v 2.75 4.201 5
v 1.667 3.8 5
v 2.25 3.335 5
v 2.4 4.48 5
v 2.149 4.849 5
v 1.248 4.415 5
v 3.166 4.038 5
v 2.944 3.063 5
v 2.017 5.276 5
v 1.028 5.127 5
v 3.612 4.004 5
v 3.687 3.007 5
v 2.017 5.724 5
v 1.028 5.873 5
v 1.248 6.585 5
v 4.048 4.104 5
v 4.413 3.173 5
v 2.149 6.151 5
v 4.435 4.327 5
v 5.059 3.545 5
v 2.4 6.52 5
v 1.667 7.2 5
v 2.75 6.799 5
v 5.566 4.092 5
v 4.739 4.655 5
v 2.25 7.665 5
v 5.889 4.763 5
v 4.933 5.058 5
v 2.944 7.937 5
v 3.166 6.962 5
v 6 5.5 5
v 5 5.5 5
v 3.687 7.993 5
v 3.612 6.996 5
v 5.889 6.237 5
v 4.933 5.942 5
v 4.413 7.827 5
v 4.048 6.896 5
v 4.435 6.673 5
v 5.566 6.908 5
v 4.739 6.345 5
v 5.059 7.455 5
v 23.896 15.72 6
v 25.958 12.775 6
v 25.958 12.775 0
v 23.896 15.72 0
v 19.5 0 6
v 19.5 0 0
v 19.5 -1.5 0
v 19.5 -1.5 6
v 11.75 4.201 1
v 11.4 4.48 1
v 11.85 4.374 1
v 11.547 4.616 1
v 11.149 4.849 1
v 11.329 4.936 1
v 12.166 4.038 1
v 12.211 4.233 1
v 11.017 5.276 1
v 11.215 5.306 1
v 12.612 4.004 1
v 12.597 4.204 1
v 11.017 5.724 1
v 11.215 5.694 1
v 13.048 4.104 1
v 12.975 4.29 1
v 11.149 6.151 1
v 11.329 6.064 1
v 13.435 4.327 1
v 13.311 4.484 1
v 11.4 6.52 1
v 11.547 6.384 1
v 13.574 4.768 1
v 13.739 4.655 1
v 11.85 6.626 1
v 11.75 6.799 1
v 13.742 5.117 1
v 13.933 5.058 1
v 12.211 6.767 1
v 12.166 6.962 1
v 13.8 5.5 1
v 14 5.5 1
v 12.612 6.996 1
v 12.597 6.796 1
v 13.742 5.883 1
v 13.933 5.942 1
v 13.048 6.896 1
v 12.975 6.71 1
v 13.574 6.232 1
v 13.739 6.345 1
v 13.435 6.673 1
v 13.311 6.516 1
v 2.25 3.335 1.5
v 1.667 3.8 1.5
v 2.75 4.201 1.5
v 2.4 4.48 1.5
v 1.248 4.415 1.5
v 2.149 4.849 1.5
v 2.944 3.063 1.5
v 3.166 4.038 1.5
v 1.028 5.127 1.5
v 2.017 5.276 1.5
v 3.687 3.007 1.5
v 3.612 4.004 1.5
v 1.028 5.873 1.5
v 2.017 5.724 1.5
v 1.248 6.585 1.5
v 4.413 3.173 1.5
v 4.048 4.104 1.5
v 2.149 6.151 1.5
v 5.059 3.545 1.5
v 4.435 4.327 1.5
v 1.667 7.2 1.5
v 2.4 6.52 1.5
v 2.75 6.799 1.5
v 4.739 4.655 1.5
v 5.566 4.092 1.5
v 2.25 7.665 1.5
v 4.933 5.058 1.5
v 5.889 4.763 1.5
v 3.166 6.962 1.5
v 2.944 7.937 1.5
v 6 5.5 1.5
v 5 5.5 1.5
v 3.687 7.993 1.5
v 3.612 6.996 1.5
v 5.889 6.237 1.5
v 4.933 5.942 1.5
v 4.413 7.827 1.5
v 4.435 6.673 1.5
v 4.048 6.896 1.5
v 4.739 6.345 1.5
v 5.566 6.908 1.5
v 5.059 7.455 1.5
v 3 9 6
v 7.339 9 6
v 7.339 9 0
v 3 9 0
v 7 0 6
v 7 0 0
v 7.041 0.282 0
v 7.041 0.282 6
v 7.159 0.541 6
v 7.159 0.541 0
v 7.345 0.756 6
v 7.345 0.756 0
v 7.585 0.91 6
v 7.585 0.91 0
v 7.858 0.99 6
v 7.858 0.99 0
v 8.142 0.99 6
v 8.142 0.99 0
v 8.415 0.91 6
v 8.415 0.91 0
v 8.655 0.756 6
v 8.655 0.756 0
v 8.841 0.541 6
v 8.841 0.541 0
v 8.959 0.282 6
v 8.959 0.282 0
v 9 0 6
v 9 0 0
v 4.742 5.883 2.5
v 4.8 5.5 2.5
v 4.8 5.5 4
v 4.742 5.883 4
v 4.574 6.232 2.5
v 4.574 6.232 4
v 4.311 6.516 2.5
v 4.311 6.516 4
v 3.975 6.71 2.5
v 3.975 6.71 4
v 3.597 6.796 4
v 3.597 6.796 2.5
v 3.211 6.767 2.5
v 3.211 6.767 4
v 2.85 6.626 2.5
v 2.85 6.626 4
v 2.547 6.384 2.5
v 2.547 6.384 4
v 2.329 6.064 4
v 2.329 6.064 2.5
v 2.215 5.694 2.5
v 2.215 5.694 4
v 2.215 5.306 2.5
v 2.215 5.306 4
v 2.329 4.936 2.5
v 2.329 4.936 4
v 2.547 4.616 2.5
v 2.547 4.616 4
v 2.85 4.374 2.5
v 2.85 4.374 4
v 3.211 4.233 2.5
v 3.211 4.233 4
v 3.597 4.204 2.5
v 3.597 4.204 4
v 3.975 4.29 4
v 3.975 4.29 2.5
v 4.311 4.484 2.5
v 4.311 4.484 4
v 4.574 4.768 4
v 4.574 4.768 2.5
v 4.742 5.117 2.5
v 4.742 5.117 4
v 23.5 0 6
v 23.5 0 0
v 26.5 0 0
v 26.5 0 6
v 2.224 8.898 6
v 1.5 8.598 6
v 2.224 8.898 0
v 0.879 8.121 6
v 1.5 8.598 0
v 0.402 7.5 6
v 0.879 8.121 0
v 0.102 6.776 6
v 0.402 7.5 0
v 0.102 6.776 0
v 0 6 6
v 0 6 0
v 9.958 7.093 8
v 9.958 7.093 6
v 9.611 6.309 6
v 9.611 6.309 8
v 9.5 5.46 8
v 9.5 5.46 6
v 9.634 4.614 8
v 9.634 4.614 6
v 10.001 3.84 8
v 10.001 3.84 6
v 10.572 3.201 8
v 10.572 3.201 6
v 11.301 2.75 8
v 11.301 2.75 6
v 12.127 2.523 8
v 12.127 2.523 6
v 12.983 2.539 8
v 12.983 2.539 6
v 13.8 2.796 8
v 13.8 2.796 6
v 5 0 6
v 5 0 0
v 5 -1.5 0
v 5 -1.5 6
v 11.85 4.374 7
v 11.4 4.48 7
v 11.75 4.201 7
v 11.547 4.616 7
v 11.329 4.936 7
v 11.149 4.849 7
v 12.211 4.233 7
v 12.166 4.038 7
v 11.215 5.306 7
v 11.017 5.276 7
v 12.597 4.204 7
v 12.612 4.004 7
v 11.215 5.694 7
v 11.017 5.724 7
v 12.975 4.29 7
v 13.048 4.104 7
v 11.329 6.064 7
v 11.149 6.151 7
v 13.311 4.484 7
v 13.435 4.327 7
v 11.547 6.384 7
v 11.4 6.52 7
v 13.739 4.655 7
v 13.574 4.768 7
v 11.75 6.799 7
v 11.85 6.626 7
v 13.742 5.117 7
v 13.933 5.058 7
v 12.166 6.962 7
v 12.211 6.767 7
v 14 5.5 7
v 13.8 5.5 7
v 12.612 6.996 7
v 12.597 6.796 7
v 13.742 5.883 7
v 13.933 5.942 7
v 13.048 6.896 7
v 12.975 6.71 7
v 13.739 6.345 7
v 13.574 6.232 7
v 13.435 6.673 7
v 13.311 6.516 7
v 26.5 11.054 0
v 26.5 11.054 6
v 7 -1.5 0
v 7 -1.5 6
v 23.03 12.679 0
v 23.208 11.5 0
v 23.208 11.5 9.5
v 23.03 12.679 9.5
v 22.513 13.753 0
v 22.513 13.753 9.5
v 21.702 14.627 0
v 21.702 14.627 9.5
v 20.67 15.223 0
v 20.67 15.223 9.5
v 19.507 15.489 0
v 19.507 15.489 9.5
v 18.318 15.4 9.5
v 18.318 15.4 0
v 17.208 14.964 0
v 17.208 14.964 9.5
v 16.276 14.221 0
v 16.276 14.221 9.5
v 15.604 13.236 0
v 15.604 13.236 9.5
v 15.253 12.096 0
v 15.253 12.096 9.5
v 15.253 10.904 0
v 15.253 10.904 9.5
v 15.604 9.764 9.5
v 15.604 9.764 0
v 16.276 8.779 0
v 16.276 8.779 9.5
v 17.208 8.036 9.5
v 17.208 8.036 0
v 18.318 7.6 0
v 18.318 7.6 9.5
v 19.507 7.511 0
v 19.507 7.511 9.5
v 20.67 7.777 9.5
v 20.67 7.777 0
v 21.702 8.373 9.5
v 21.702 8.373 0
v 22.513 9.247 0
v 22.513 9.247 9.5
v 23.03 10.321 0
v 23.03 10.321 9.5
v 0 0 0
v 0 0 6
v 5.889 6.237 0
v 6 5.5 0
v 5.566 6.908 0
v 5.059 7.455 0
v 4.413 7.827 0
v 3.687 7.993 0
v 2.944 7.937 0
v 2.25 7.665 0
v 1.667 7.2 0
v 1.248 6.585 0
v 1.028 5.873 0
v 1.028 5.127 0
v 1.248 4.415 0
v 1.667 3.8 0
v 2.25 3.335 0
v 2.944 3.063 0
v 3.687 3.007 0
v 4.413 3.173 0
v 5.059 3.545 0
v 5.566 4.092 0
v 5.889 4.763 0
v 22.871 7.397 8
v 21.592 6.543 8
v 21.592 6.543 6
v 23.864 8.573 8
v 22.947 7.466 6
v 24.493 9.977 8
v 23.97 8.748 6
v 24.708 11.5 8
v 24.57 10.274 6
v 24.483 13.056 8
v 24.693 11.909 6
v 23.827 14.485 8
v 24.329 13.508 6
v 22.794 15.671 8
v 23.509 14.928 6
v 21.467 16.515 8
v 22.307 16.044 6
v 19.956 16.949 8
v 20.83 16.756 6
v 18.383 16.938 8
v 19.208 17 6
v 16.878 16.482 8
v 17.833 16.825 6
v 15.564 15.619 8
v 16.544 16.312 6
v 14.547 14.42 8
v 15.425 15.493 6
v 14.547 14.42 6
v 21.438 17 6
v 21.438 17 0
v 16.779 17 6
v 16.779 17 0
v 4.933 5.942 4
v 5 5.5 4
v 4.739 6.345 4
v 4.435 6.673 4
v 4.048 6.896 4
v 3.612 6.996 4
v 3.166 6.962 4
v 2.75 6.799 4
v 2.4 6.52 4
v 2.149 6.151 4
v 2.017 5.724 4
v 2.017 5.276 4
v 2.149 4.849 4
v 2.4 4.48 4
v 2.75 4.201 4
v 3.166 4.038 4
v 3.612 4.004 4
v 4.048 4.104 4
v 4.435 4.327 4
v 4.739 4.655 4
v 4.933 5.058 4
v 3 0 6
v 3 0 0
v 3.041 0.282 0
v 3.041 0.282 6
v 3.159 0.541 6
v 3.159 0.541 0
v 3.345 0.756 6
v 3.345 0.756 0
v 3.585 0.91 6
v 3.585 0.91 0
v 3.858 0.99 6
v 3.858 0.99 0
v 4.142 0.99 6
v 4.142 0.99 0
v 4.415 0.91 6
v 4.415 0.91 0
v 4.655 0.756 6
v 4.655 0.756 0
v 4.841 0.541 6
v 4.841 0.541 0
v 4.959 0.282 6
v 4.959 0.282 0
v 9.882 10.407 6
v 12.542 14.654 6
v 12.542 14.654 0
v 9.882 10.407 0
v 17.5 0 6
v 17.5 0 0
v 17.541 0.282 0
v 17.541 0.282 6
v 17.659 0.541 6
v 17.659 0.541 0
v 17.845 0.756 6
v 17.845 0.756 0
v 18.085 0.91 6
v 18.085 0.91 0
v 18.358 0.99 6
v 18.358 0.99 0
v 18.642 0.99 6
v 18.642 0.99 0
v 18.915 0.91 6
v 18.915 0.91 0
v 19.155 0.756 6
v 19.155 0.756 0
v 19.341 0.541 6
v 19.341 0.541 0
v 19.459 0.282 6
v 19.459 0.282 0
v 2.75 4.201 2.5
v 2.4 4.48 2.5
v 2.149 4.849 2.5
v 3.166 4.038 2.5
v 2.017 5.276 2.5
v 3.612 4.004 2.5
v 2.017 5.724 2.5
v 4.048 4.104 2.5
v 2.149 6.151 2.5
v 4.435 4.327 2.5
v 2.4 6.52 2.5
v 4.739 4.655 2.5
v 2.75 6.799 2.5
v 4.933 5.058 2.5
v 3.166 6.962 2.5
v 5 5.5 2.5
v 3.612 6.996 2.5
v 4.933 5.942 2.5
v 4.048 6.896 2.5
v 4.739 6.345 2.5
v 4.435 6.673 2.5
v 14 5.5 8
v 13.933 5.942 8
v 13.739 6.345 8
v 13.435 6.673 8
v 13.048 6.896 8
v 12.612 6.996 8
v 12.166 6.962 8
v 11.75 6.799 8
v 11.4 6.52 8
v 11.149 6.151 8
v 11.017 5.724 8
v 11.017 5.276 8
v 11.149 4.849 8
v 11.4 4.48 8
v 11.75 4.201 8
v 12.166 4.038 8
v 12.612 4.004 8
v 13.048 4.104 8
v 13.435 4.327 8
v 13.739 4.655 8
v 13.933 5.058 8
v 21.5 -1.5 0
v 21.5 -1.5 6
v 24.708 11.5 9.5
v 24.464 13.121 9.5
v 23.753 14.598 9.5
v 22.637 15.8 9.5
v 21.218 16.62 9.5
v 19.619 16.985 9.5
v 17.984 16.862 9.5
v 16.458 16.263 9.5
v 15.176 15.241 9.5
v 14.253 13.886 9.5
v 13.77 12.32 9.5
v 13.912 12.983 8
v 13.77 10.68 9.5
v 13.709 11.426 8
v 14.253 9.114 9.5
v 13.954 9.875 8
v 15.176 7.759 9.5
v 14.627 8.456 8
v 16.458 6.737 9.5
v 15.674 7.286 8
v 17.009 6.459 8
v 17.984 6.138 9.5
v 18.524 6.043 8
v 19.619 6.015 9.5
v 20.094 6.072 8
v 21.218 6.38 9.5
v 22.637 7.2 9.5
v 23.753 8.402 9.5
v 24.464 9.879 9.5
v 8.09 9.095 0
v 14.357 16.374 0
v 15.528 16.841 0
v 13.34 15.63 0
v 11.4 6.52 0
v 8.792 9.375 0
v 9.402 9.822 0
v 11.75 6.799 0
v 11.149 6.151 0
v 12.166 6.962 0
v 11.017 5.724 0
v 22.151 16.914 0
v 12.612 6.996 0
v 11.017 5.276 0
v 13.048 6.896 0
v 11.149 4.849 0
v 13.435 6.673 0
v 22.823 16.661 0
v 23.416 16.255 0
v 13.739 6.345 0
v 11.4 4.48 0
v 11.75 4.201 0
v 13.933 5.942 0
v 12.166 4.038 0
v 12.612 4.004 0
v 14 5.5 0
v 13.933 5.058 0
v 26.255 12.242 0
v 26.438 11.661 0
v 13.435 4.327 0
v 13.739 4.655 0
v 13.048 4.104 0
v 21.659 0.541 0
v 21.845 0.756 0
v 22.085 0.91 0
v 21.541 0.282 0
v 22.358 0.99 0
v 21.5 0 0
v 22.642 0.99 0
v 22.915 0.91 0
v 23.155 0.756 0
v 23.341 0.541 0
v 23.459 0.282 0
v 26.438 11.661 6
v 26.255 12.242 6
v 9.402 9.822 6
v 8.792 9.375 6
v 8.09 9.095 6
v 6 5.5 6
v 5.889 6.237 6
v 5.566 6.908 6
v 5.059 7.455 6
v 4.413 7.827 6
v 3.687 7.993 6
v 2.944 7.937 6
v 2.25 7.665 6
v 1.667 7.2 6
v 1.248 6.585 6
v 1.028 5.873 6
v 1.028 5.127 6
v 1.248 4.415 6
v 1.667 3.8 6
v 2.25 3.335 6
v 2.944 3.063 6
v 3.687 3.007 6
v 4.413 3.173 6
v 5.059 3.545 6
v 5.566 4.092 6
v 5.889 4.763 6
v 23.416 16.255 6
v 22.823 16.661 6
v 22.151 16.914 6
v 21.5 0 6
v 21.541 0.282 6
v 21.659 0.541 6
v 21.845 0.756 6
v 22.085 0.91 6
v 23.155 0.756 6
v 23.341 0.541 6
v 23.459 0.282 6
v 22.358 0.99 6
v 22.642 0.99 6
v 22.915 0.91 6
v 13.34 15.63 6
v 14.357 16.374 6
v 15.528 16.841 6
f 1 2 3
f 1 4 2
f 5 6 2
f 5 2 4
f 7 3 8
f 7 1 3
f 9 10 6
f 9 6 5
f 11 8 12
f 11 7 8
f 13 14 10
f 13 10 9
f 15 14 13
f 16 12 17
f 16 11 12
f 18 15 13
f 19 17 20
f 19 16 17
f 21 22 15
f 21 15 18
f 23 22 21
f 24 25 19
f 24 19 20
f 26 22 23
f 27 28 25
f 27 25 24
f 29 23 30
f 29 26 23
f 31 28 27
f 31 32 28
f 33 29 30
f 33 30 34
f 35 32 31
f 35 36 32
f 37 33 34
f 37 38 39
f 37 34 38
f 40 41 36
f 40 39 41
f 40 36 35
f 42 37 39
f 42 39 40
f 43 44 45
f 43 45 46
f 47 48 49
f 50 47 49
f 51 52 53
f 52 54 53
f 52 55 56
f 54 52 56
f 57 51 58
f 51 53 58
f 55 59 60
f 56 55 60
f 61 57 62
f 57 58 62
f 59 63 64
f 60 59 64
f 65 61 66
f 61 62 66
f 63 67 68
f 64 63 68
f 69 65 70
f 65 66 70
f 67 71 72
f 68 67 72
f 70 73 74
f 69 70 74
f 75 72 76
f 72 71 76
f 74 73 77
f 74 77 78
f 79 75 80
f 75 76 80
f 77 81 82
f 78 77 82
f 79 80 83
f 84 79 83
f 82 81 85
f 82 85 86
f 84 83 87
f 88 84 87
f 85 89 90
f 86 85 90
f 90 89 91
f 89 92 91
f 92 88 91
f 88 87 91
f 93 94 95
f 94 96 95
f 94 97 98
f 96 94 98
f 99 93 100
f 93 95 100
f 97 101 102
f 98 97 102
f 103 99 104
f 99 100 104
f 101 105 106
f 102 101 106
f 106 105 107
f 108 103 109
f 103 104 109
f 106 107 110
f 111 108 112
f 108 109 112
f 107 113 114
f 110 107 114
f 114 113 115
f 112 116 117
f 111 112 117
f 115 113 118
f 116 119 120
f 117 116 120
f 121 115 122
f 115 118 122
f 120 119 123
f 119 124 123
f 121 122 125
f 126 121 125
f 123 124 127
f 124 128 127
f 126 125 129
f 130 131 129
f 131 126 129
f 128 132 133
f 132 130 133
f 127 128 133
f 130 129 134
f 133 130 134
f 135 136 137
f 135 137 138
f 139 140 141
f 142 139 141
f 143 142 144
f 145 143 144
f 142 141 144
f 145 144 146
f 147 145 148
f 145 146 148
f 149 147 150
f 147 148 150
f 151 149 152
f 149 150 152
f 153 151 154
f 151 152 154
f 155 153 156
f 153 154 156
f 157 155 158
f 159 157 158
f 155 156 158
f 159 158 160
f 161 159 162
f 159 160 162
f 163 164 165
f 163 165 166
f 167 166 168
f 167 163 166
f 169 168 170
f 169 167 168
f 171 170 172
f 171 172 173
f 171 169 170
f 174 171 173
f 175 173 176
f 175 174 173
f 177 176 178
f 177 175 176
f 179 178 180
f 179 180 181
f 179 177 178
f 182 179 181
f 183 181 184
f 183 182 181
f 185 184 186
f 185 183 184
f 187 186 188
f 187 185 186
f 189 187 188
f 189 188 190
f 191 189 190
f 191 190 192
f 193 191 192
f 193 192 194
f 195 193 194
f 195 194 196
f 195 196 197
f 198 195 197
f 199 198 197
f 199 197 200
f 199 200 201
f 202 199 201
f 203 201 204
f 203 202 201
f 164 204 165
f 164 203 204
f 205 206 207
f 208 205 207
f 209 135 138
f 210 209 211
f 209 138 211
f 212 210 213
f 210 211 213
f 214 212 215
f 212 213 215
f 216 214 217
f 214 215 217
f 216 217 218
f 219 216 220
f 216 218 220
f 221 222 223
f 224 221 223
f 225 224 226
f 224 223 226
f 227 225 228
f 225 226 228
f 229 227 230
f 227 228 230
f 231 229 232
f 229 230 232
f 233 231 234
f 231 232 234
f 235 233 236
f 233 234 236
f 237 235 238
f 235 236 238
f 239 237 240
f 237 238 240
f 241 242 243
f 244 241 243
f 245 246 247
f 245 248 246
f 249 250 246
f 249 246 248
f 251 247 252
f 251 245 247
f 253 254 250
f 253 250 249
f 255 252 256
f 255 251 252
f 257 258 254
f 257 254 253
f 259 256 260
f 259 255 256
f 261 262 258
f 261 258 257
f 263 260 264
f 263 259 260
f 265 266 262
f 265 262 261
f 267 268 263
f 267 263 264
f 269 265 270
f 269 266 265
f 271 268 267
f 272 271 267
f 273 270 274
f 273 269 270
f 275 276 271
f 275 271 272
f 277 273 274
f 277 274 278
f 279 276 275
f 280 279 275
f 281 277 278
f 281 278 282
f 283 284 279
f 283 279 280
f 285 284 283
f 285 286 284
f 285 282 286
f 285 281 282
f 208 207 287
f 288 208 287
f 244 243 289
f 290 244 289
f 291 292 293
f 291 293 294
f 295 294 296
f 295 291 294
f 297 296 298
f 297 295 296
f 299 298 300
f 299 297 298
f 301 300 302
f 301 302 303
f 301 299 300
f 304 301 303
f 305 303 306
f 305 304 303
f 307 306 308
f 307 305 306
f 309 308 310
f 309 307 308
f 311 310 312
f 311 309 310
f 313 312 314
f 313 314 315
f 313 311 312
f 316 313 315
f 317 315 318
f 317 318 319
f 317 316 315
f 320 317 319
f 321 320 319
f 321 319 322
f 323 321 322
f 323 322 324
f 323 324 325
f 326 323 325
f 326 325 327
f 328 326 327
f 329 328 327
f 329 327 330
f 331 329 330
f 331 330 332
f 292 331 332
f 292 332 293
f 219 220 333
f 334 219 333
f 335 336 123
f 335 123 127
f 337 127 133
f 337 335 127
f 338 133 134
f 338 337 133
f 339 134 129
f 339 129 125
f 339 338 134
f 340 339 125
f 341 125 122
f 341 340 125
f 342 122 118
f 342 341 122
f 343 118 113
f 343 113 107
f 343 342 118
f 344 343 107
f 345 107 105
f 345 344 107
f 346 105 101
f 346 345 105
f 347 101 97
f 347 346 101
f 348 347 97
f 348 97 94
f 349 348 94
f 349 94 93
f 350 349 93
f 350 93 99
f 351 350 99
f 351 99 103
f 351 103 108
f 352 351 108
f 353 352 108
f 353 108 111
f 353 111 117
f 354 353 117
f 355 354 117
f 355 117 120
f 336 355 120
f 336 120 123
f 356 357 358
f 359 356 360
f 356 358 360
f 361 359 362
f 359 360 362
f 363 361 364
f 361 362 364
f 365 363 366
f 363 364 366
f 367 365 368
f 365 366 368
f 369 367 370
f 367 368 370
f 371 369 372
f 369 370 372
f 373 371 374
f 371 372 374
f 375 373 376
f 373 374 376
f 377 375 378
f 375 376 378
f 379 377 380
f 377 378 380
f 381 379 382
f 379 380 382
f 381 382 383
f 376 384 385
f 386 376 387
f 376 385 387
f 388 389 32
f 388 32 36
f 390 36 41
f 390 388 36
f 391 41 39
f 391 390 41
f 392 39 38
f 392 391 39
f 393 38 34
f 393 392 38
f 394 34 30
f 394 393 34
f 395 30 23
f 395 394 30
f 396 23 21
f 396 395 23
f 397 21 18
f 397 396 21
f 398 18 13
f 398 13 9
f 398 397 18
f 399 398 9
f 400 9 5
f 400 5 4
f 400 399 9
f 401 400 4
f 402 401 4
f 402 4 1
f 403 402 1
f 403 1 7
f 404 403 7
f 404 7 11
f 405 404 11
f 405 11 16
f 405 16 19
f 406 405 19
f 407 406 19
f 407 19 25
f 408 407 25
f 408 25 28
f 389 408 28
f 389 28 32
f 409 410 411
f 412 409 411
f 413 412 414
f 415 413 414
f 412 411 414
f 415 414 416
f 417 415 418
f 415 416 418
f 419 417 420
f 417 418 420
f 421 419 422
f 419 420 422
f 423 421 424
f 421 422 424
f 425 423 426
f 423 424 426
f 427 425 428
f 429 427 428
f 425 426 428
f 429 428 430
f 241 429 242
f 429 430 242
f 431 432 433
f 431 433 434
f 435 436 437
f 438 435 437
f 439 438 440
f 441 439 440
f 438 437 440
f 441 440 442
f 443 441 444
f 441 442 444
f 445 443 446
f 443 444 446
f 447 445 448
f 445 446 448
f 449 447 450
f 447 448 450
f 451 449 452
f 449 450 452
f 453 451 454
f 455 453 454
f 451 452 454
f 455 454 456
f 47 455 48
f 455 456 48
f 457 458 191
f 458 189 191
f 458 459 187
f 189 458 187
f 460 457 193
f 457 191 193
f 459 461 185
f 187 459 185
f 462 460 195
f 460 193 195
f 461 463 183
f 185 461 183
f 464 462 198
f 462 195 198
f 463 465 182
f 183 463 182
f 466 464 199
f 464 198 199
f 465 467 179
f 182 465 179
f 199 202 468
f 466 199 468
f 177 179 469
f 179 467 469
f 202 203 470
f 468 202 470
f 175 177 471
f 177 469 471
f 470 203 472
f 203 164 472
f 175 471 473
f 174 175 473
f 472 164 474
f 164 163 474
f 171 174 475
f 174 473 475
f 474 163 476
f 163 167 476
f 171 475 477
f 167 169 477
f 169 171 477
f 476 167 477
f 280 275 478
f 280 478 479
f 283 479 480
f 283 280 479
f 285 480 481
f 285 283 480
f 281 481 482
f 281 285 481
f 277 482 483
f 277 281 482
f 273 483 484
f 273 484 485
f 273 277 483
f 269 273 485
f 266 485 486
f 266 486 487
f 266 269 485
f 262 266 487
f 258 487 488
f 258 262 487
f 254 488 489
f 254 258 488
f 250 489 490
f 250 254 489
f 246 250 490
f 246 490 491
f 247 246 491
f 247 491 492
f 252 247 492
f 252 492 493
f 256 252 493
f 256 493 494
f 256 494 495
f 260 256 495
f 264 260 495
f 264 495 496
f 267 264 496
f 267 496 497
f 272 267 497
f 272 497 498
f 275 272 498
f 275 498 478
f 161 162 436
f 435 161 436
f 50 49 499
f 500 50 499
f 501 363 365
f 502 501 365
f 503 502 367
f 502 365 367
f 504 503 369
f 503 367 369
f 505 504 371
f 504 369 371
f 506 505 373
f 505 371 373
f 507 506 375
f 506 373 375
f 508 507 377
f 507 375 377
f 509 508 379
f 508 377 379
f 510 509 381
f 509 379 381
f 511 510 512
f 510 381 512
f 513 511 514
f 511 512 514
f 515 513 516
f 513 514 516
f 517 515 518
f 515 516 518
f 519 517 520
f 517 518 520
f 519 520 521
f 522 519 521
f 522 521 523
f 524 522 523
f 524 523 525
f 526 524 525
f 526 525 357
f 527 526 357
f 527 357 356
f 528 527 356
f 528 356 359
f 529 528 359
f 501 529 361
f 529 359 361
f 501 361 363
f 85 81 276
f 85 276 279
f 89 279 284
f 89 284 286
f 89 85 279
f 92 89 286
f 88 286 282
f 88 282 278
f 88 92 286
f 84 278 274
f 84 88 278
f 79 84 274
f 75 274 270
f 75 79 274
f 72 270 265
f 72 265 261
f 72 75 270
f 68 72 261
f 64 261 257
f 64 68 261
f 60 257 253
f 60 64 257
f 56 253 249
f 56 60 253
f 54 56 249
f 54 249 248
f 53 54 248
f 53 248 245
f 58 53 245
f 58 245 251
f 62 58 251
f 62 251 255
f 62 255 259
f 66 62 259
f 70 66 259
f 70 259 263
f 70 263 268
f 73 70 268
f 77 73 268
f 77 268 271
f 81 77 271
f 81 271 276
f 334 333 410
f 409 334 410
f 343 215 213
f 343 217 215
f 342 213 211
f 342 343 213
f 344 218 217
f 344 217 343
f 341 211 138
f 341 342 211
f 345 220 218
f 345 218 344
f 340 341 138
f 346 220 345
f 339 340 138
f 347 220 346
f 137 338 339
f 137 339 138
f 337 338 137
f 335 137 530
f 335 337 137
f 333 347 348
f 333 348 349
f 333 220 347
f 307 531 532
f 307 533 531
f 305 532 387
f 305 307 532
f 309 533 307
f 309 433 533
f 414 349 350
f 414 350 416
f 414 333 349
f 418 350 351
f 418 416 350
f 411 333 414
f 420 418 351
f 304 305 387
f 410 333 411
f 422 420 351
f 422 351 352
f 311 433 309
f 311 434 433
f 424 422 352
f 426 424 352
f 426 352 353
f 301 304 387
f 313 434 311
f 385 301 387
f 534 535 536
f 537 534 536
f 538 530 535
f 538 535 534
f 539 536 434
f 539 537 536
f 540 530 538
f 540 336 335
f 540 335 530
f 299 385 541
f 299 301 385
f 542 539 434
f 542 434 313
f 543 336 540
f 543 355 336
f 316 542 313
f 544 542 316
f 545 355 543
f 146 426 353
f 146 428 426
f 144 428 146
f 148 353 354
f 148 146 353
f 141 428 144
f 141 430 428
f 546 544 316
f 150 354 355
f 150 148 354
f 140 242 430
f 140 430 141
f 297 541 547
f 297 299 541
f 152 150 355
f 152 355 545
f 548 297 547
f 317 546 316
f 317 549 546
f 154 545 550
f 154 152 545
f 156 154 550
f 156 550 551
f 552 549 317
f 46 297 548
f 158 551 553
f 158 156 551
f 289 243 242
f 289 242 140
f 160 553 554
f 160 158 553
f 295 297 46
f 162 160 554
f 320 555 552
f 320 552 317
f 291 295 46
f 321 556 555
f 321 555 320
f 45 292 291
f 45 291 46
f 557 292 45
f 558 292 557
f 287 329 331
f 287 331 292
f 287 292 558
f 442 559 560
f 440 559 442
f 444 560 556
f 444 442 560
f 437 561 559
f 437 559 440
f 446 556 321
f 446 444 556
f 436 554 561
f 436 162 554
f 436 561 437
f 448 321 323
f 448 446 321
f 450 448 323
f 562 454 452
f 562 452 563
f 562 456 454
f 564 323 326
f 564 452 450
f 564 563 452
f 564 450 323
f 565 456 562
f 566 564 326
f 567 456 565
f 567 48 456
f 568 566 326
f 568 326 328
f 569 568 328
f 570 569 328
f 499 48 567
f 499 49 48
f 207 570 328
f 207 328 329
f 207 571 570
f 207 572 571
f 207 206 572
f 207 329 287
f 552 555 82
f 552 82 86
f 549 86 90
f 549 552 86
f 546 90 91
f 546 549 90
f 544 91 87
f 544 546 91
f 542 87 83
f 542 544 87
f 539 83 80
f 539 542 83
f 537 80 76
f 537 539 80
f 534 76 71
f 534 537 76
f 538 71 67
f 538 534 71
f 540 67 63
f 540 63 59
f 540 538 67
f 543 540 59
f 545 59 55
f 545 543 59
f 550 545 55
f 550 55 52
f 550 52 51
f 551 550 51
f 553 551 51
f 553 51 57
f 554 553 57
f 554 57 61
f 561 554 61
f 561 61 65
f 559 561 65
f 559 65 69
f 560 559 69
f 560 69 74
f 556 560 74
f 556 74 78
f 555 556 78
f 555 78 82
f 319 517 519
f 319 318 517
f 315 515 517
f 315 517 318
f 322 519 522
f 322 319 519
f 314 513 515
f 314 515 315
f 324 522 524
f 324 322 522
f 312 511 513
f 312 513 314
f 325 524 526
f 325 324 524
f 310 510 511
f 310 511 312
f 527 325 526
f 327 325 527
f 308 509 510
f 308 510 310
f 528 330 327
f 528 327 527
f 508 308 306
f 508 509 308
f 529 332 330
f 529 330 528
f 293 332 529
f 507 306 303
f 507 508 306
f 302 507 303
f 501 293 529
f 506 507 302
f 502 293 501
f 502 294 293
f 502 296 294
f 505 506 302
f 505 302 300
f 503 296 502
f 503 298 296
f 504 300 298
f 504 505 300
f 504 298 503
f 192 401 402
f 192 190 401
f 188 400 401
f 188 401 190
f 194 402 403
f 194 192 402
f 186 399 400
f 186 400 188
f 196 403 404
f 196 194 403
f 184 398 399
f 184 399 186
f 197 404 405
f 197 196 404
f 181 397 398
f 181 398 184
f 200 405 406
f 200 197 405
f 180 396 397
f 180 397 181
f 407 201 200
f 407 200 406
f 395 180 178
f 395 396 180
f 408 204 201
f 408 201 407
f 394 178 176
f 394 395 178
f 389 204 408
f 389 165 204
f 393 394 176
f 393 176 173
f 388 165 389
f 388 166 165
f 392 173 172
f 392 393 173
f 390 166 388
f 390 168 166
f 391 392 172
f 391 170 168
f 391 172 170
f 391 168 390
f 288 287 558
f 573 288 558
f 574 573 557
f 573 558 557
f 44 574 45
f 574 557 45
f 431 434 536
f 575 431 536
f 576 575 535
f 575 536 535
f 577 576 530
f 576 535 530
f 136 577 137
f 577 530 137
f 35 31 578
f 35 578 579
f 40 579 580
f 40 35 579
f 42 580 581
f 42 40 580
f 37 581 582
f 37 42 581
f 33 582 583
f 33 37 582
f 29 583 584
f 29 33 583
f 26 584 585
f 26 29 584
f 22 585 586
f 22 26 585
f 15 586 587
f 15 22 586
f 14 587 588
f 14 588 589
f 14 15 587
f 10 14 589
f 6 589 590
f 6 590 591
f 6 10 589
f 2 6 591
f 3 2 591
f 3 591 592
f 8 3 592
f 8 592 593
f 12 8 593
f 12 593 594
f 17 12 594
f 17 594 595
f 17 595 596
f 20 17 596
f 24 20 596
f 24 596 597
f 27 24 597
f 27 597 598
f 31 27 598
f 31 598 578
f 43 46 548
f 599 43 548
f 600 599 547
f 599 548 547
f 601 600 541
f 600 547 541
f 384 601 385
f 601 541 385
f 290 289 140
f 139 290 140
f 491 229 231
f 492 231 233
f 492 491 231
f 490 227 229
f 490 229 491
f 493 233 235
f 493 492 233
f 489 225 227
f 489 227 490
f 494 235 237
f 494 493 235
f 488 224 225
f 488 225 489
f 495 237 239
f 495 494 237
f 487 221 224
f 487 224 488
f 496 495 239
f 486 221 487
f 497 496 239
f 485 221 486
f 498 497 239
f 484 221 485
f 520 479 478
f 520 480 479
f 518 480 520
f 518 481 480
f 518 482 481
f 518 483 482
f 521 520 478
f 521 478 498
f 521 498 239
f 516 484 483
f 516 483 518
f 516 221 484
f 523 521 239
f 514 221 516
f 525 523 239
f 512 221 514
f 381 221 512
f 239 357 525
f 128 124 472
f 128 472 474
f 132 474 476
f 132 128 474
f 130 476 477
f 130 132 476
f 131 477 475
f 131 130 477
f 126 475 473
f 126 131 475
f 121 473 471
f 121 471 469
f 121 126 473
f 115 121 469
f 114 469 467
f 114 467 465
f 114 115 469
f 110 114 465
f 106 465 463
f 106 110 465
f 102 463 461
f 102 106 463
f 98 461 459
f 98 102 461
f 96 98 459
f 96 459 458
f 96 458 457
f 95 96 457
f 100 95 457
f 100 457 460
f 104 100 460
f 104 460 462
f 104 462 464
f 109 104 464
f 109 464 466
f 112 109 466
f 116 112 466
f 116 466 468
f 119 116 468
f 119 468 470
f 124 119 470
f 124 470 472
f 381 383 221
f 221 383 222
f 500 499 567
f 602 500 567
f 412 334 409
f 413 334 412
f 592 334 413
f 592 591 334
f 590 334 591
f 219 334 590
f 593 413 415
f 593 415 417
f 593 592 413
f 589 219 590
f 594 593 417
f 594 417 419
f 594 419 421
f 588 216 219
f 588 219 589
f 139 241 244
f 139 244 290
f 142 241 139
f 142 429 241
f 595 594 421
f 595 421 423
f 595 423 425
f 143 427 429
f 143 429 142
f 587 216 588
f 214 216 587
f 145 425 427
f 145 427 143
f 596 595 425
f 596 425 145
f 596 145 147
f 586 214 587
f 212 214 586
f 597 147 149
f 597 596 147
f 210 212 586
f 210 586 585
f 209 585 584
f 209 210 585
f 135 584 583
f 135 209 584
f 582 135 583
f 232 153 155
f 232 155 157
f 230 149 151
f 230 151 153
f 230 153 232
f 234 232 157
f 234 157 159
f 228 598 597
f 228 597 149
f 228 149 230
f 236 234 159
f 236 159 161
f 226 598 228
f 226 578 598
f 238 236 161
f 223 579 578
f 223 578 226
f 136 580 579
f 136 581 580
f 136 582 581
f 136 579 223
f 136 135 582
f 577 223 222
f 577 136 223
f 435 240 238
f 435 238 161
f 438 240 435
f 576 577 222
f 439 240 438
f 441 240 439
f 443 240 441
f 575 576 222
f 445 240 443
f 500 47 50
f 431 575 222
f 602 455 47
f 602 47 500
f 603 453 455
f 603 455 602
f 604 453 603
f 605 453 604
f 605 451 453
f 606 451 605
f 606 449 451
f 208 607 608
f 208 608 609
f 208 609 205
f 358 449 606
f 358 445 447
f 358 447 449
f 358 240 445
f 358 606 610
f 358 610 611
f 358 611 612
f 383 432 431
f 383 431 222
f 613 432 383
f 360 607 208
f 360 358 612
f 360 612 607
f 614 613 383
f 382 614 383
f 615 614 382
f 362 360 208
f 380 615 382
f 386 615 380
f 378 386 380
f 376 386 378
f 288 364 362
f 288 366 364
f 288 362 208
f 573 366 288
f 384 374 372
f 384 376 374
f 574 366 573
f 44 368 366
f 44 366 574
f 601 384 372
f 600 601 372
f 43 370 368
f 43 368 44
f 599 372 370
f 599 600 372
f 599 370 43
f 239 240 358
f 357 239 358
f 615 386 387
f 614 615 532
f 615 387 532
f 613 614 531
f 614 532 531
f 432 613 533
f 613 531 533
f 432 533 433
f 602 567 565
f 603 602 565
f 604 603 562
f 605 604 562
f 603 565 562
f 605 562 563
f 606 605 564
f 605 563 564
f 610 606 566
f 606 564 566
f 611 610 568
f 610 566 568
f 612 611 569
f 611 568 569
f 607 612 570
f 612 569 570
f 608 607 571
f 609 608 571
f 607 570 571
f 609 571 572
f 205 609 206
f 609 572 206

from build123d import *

# Parameters (mm, degrees)
SKETCH1_W             = 26.5
SKETCH1_H             = 6
BOSS_EXTRUDE1_DEPTH   = 17
SKETCH2_R             = 1.5
CUT_EXTRUDE1_DEPTH    = 1
SKETCH3_R             = 1.3
CUT_EXTRUDE2_DEPTH    = 32.878676259
SKETCH4_R             = 4
CUT_EXTRUDE3_DEPTH    = 33.050741021
SKETCH5_R             = 2.5
CUT_EXTRUDE4_DEPTH    = 1.5
SKETCH6_R             = 1.5
CUT_EXTRUDE8_DEPTH    = 1
SKETCH7_R             = 1.3
CUT_EXTRUDE9_DEPTH    = 32.678068123
CUT_EXTRUDE10_START   = -1
SKETCH8_R             = 2.5
CUT_EXTRUDE10_DEPTH   = 1
CUT_EXTRUDE11_START   = -1
SKETCH9_R             = 1.5
CUT_EXTRUDE11_DEPTH   = 1
SKETCH10_R            = 5.5
SKETCH10_R_2          = 4
BOSS_EXTRUDE2_DEPTH   = 3.5
SKETCH11_R            = 3
SKETCH11_R_2          = 1.3
BOSS_EXTRUDE4_DEPTH   = 2
CUT_EXTRUDE12_START   = -1
SKETCH12_R            = 1.5
CUT_EXTRUDE12_DEPTH   = 1
SKETCH17_W            = 2
SKETCH17_H            = 6
BOSS_EXTRUDE6_DEPTH   = 1.5
SKETCH18_R            = 1
CUT_EXTRUDE17_DEPTH   = 33.050741021
CHAMFER2_SIZE         = 5
CHAMFER2_SIZE2        = 3.5
FILLET11_R            = 3
BOSS_EXTRUDE7_DEPTH   = 2
CUT_EXTRUDE19_DEPTH   = 33.050741021
FILLET13_R            = 5
FILLET14_R            = 3
FILLET15_R            = 3
MIRROR6_OUTLINE_R     = 4
MIRROR6_OUTLINE_R_2   = 2.5
MIRROR6_OUTLINE_R_3   = 1.5
MIRROR6_DEPTH         = 6
MIRROR6_START         = 6
MIRROR6_2_OUTLINE_R   = 4
MIRROR6_2_OUTLINE_R_2 = 1.5
MIRROR6_2_DEPTH       = 2
MIRROR6_START_2       = 8
MIRROR6_3_OUTLINE_R   = 5.5
MIRROR6_3_OUTLINE_R_2 = 4
MIRROR6_3_DEPTH       = 1.5
MIRROR6_START_3       = 1.5
MIRROR6_4_OUTLINE_R   = 1.5
MIRROR6_4_OUTLINE_R_2 = 1.3
MIRROR6_4_OUTLINE_R_3 = 2.5
MIRROR6_4_DEPTH       = 3.5
MIRROR6_START_4       = 1
MIRROR6_5_OUTLINE_R   = 1.5
MIRROR6_5_OUTLINE_R_2 = 1.3
MIRROR6_5_DEPTH       = 6
MIRROR6_START_5       = 2.5
MIRROR6_6_OUTLINE_R   = 1.5
MIRROR6_6_OUTLINE_R_2 = 1.3
MIRROR6_6_DEPTH       = 1.5
CUT_EXTRUDE20_DEPTH   = 34.963215396


# Read off the part's stored shape, not the designer's step: Mirror6
with BuildPart() as part:
    # Sketch1 → Boss-Extrude1 (new body)
    with BuildSketch(Plane(origin=(0, 0, 0), x_dir=(1, 0, 0), z_dir=(0, 1, 0))):
        with Locations((13.25, 3)):
            Rectangle(SKETCH1_W, SKETCH1_H)
    extrude(amount=BOSS_EXTRUDE1_DEPTH)

    # Sketch2 → Cut-Extrude1 (cut)
    with BuildSketch(Plane.XY):
        with Locations((12.5, 5.5)):
            Circle(SKETCH2_R)
    extrude(amount=-CUT_EXTRUDE1_DEPTH, mode=Mode.SUBTRACT)

    # Sketch3 → Cut-Extrude2 (cut, through all)
    with BuildSketch(Plane.XY.offset(-1)):
        with Locations((12.5, 5.5)):
            Circle(SKETCH3_R)
    extrude(amount=-CUT_EXTRUDE2_DEPTH, mode=Mode.SUBTRACT)

    # Sketch4 → Cut-Extrude3 (cut, through all)
    with BuildSketch(Plane.XY):
        with Locations((19.208203932, 11.5)):
            Circle(SKETCH4_R)
    extrude(amount=-CUT_EXTRUDE3_DEPTH, mode=Mode.SUBTRACT)

    # Sketch5 → Cut-Extrude4 (cut)
    with BuildSketch(Plane.XY):
        with Locations((3.5, 5.5)):
            Circle(SKETCH5_R)
    extrude(amount=-CUT_EXTRUDE4_DEPTH, mode=Mode.SUBTRACT)

    # Sketch6 → Cut-Extrude8 (cut)
    with BuildSketch(Plane.XY.offset(-1.5)):
        with Locations((3.5, 5.5)):
            Circle(SKETCH6_R)
    extrude(amount=-CUT_EXTRUDE8_DEPTH, mode=Mode.SUBTRACT)

    # Sketch7 → Cut-Extrude9 (cut, through all)
    with BuildSketch(Plane.XY.offset(-2.5)):
        with Locations((3.5, 5.5)):
            Circle(SKETCH7_R)
    extrude(amount=-CUT_EXTRUDE9_DEPTH, mode=Mode.SUBTRACT)

    # Sketch8 → Cut-Extrude10 (cut)
    with BuildSketch(Plane(origin=(0, 0, -6), x_dir=(-1, 0, 0), z_dir=(0, 0, -1)).offset(CUT_EXTRUDE10_START)):
        with Locations(Location((-3.5, 5.5, 0), (0, 0, 180))):
            Circle(SKETCH8_R)
    extrude(amount=CUT_EXTRUDE10_DEPTH, mode=Mode.SUBTRACT)

    # Sketch9 → Cut-Extrude11 (cut)
    with BuildSketch(Plane(origin=(0, 0, -5), x_dir=(-1, 0, 0), z_dir=(0, 0, -1)).offset(CUT_EXTRUDE11_START)):
        with Locations(Location((-3.5, 5.5, 0), (0, 0, 180))):
            Circle(SKETCH9_R)
    extrude(amount=CUT_EXTRUDE11_DEPTH, mode=Mode.SUBTRACT)

    # Sketch10 → Boss-Extrude2 (add)
    with BuildSketch(Plane(origin=(0, 0, -6), x_dir=(-1, 0, 0), z_dir=(0, 0, -1))):
        with Locations(Location((-19.208203932, 11.5, 0), (0, 0, 90))):
            Circle(SKETCH10_R)
        with Locations(Location((-19.208203932, 11.5, 0), (0, 0, 180))):
            Circle(SKETCH10_R_2, mode=Mode.SUBTRACT)
    extrude(amount=BOSS_EXTRUDE2_DEPTH)

    # Sketch11 → Boss-Extrude4 (add)
    with BuildSketch(Plane(origin=(0, 0, -6), x_dir=(-1, 0, 0), z_dir=(0, 0, -1))):
        with Locations(Location((-12.5, 5.5, 0), (0, 0, 180))):
            Circle(SKETCH11_R)
        with Locations(Location((-12.5, 5.5, 0), (0, 0, 180))):
            Circle(SKETCH11_R_2, mode=Mode.SUBTRACT)
    extrude(amount=BOSS_EXTRUDE4_DEPTH)

    # Sketch12 → Cut-Extrude12 (cut)
    with BuildSketch(Plane(origin=(0, 0, -8), x_dir=(-1, 0, 0), z_dir=(0, 0, -1)).offset(CUT_EXTRUDE12_START)):
        with Locations(Location((-12.5, 5.5, 0), (0, 0, 180))):
            Circle(SKETCH12_R)
    extrude(amount=CUT_EXTRUDE12_DEPTH, mode=Mode.SUBTRACT)

    # Sketch17 → Boss-Extrude6 (add)
    with BuildSketch(Plane.XZ):
        with Locations((6, -3)):
            Rectangle(SKETCH17_W, SKETCH17_H)
        with Locations((20.5, -3)):
            Rectangle(SKETCH17_W, SKETCH17_H)
    extrude(amount=BOSS_EXTRUDE6_DEPTH)

    # Sketch18 → Cut-Extrude17 (cut, through all)
    with BuildSketch(Plane(origin=(0, 0, -6), x_dir=(-1, 0, 0), z_dir=(0, 0, -1))):
        with Locations((-22.5, 0)):
            Circle(SKETCH18_R)
        with Locations((-18.5, 0)):
            Circle(SKETCH18_R)
        with Locations((-8, 0)):
            Circle(SKETCH18_R)
        with Locations((-4, 0)):
            Circle(SKETCH18_R)
    extrude(amount=-CUT_EXTRUDE17_DEPTH, mode=Mode.SUBTRACT)

    # Chamfer2
    chamfer2_edges = [part.edges().sort_by_distance(p)[0] for p in [
        (26.5, 17, -3),
    ]]
    chamfer2_side = [part.faces().sort_by_distance(p)[0] for p in [
        (26.5, 8.5, -3),
    ]]
    chamfer(chamfer2_edges, length=CHAMFER2_SIZE, length2=CHAMFER2_SIZE2, reference=chamfer2_side[0])

    # Fillet11
    fillet11_edges = [part.edges().sort_by_distance(p)[0] for p in [
        (23, 17, -3),
        (26.5, 12, -3),
    ]]
    fillet(fillet11_edges, radius=FILLET11_R)

    # Sketch19 → Boss-Extrude7 (add)
    with BuildSketch(Plane(origin=(0, 0, -6), x_dir=(-1, 0, 0), z_dir=(0, 0, -1))):
        with BuildLine():
            Line((-14.547099294, 14.419606745), (-9.957579288, 7.09251277))
            ThreePointArc((-9.957579288, 7.09251277), (-14.736067977, 7.5), (-13.800160725, 2.796376119))
            Line((-13.800160725, 2.796376119), (-21.591831928, 6.543356218))
            ThreePointArc((-21.591831928, 6.543356218), (-15.108745974, 7.833333333), (-14.547099294, 14.419606745))
        make_face()
    extrude(amount=BOSS_EXTRUDE7_DEPTH)

    # Sketch20 → Cut-Extrude19 (cut, through all)
    with BuildSketch(Plane(origin=(0, 0, -6), x_dir=(-1, 0, 0), z_dir=(0, 0, -1))):
        Polygon((0, 17), (-14.011012575, 17), (-9, 9), (0, 9), align=None)
    extrude(amount=-CUT_EXTRUDE19_DEPTH, mode=Mode.SUBTRACT)

    # Fillet13
    fillet13_edges = [part.edges().sort_by_distance(p)[0] for p in [
        (14.011012575, 17, -3),
    ]]
    fillet(fillet13_edges, radius=FILLET13_R)

    # Fillet14
    fillet14_edges = [part.edges().sort_by_distance(p)[0] for p in [
        (9, 9, -3),
    ]]
    fillet(fillet14_edges, radius=FILLET14_R)

    # Fillet15
    fillet15_edges = [part.edges().sort_by_distance(p)[0] for p in [
        (0, 9, -3),
    ]]
    fillet(fillet15_edges, radius=FILLET15_R)

    # Mirror6 outline → Mirror6 (add)
    with BuildSketch(Plane.XY):
        with BuildLine():
            Line((21.438033315, 17), (16.779018718, 17))
            ThreePointArc((16.779018718, 17), (14.357339523, 16.374410803), (12.541650865, 14.65418795))
            Line((12.541650865, 14.65418795), (9.881617026, 10.40748723))
            ThreePointArc((9.881617026, 10.40748723), (8.792203831, 9.375353518), (7.339196314, 9))
            Line((7.339196314, 9), (3, 9))
            ThreePointArc((3, 9), (0.878679656, 8.121320344), (0, 6))
            Line((0, 6), (0, 0))
            Line((0, 0), (3, 0))
            ThreePointArc((3, 0), (4, 1), (5, 0))
            Line((5, 0), (5, -1.5))
            Line((5, -1.5), (7, -1.5))
            Line((7, -1.5), (7, 0))
            ThreePointArc((7, 0), (8, 1), (9, 0))
            Line((9, 0), (17.5, 0))
            ThreePointArc((17.5, 0), (18.5, 1), (19.5, 0))
            Line((19.5, 0), (19.5, -1.5))
            Line((19.5, -1.5), (21.5, -1.5))
            Line((21.5, -1.5), (21.5, 0))
            ThreePointArc((21.5, 0), (22.5, 1), (23.5, 0))
            Line((23.5, 0), (26.5, 0))
            Line((26.5, 0), (26.5, 11.054333308))
            ThreePointArc((26.5, 11.054333308), (26.361213666, 11.956251462), (25.957695762, 12.774720341))
            Line((25.957695762, 12.774720341), (23.895729077, 15.720387033))
            ThreePointArc((23.895729077, 15.720387033), (22.823464458, 16.660936029), (21.438033315, 17))
        make_face()
        with Locations((19.208203932, 11.5)):
            Circle(MIRROR6_OUTLINE_R, mode=Mode.SUBTRACT)
        with Locations((3.5, 5.5)):
            Circle(MIRROR6_OUTLINE_R_2, mode=Mode.SUBTRACT)
        with Locations((12.5, 5.5)):
            Circle(MIRROR6_OUTLINE_R_3, mode=Mode.SUBTRACT)
    extrude(amount=MIRROR6_DEPTH)

    # Mirror6 2 outline → Mirror6 2 (add)
    with BuildSketch(Plane.XY.offset(MIRROR6_START)):
        with BuildLine():
            Line((14.547099293, 14.419606745), (9.957579288, 7.09251277))
            ThreePointArc((9.957579288, 7.09251277), (10.263932023, 3.5), (13.800160725, 2.796376119))
            Line((13.800160725, 2.796376119), (21.591831928, 6.543356218))
            ThreePointArc((21.591831928, 6.543356218), (23.307661891, 15.166666667), (14.547099293, 14.419606745))
        make_face()
        with Locations((19.208203932, 11.5)):
            Circle(MIRROR6_2_OUTLINE_R, mode=Mode.SUBTRACT)
        with Locations((12.5, 5.5)):
            Circle(MIRROR6_2_OUTLINE_R_2, mode=Mode.SUBTRACT)
    extrude(amount=MIRROR6_2_DEPTH)

    # Mirror6 3 outline → Mirror6 3 (add)
    with BuildSketch(Plane.XY.offset(MIRROR6_START_2)):
        with Locations((19.208203932, 11.5)):
            Circle(MIRROR6_3_OUTLINE_R)
        with Locations((19.208203932, 11.5)):
            Circle(MIRROR6_3_OUTLINE_R_2, mode=Mode.SUBTRACT)
    extrude(amount=MIRROR6_3_DEPTH)

    # Mirror6 4 outline → Mirror6 4 (add)
    # profile 1 of 2: a face of its own
    with BuildSketch(Plane.XY.offset(MIRROR6_START_3)):
        with Locations((12.5, 5.5)):
            Circle(MIRROR6_4_OUTLINE_R)
        with Locations((12.5, 5.5)):
            Circle(MIRROR6_4_OUTLINE_R_2, mode=Mode.SUBTRACT)
    # profile 2 of 2: a face of its own
    with BuildSketch(Plane.XY.offset(MIRROR6_START_3)):
        with Locations((3.5, 5.5)):
            Circle(MIRROR6_4_OUTLINE_R_3)
        with Locations((3.5, 5.5)):
            Circle(MIRROR6_4_OUTLINE_R, mode=Mode.SUBTRACT)
    extrude(amount=MIRROR6_4_DEPTH)

    # Mirror6 5 outline → Mirror6 5 (add)
    with BuildSketch(Plane.XY.offset(MIRROR6_START_4)):
        with Locations((12.5, 5.5)):
            Circle(MIRROR6_5_OUTLINE_R)
        with Locations((12.5, 5.5)):
            Circle(MIRROR6_5_OUTLINE_R_2, mode=Mode.SUBTRACT)
    extrude(amount=MIRROR6_5_DEPTH)

    # Mirror6 6 outline → Mirror6 6 (add)
    with BuildSketch(Plane.XY.offset(MIRROR6_START_5)):
        with Locations((3.5, 5.5)):
            Circle(MIRROR6_6_OUTLINE_R)
        with Locations((3.5, 5.5)):
            Circle(MIRROR6_6_OUTLINE_R_2, mode=Mode.SUBTRACT)
    extrude(amount=MIRROR6_6_DEPTH)

    # Sketch24 → Cut-Extrude20 (cut, through all)
    with BuildSketch(Plane(origin=(0, -2, 0), x_dir=(1, 0, 0), z_dir=(0, 1, 0))):
        Polygon((0, 0), (26.5, 0), (26.5, 6), (26.5, 9.5), (24.708203932, 9.5), (13.708203932, 9.5), (0, 9.5), (0, 6), align=None)
    extrude(amount=CUT_EXTRUDE20_DEPTH, mode=Mode.SUBTRACT)


solid = part.part
